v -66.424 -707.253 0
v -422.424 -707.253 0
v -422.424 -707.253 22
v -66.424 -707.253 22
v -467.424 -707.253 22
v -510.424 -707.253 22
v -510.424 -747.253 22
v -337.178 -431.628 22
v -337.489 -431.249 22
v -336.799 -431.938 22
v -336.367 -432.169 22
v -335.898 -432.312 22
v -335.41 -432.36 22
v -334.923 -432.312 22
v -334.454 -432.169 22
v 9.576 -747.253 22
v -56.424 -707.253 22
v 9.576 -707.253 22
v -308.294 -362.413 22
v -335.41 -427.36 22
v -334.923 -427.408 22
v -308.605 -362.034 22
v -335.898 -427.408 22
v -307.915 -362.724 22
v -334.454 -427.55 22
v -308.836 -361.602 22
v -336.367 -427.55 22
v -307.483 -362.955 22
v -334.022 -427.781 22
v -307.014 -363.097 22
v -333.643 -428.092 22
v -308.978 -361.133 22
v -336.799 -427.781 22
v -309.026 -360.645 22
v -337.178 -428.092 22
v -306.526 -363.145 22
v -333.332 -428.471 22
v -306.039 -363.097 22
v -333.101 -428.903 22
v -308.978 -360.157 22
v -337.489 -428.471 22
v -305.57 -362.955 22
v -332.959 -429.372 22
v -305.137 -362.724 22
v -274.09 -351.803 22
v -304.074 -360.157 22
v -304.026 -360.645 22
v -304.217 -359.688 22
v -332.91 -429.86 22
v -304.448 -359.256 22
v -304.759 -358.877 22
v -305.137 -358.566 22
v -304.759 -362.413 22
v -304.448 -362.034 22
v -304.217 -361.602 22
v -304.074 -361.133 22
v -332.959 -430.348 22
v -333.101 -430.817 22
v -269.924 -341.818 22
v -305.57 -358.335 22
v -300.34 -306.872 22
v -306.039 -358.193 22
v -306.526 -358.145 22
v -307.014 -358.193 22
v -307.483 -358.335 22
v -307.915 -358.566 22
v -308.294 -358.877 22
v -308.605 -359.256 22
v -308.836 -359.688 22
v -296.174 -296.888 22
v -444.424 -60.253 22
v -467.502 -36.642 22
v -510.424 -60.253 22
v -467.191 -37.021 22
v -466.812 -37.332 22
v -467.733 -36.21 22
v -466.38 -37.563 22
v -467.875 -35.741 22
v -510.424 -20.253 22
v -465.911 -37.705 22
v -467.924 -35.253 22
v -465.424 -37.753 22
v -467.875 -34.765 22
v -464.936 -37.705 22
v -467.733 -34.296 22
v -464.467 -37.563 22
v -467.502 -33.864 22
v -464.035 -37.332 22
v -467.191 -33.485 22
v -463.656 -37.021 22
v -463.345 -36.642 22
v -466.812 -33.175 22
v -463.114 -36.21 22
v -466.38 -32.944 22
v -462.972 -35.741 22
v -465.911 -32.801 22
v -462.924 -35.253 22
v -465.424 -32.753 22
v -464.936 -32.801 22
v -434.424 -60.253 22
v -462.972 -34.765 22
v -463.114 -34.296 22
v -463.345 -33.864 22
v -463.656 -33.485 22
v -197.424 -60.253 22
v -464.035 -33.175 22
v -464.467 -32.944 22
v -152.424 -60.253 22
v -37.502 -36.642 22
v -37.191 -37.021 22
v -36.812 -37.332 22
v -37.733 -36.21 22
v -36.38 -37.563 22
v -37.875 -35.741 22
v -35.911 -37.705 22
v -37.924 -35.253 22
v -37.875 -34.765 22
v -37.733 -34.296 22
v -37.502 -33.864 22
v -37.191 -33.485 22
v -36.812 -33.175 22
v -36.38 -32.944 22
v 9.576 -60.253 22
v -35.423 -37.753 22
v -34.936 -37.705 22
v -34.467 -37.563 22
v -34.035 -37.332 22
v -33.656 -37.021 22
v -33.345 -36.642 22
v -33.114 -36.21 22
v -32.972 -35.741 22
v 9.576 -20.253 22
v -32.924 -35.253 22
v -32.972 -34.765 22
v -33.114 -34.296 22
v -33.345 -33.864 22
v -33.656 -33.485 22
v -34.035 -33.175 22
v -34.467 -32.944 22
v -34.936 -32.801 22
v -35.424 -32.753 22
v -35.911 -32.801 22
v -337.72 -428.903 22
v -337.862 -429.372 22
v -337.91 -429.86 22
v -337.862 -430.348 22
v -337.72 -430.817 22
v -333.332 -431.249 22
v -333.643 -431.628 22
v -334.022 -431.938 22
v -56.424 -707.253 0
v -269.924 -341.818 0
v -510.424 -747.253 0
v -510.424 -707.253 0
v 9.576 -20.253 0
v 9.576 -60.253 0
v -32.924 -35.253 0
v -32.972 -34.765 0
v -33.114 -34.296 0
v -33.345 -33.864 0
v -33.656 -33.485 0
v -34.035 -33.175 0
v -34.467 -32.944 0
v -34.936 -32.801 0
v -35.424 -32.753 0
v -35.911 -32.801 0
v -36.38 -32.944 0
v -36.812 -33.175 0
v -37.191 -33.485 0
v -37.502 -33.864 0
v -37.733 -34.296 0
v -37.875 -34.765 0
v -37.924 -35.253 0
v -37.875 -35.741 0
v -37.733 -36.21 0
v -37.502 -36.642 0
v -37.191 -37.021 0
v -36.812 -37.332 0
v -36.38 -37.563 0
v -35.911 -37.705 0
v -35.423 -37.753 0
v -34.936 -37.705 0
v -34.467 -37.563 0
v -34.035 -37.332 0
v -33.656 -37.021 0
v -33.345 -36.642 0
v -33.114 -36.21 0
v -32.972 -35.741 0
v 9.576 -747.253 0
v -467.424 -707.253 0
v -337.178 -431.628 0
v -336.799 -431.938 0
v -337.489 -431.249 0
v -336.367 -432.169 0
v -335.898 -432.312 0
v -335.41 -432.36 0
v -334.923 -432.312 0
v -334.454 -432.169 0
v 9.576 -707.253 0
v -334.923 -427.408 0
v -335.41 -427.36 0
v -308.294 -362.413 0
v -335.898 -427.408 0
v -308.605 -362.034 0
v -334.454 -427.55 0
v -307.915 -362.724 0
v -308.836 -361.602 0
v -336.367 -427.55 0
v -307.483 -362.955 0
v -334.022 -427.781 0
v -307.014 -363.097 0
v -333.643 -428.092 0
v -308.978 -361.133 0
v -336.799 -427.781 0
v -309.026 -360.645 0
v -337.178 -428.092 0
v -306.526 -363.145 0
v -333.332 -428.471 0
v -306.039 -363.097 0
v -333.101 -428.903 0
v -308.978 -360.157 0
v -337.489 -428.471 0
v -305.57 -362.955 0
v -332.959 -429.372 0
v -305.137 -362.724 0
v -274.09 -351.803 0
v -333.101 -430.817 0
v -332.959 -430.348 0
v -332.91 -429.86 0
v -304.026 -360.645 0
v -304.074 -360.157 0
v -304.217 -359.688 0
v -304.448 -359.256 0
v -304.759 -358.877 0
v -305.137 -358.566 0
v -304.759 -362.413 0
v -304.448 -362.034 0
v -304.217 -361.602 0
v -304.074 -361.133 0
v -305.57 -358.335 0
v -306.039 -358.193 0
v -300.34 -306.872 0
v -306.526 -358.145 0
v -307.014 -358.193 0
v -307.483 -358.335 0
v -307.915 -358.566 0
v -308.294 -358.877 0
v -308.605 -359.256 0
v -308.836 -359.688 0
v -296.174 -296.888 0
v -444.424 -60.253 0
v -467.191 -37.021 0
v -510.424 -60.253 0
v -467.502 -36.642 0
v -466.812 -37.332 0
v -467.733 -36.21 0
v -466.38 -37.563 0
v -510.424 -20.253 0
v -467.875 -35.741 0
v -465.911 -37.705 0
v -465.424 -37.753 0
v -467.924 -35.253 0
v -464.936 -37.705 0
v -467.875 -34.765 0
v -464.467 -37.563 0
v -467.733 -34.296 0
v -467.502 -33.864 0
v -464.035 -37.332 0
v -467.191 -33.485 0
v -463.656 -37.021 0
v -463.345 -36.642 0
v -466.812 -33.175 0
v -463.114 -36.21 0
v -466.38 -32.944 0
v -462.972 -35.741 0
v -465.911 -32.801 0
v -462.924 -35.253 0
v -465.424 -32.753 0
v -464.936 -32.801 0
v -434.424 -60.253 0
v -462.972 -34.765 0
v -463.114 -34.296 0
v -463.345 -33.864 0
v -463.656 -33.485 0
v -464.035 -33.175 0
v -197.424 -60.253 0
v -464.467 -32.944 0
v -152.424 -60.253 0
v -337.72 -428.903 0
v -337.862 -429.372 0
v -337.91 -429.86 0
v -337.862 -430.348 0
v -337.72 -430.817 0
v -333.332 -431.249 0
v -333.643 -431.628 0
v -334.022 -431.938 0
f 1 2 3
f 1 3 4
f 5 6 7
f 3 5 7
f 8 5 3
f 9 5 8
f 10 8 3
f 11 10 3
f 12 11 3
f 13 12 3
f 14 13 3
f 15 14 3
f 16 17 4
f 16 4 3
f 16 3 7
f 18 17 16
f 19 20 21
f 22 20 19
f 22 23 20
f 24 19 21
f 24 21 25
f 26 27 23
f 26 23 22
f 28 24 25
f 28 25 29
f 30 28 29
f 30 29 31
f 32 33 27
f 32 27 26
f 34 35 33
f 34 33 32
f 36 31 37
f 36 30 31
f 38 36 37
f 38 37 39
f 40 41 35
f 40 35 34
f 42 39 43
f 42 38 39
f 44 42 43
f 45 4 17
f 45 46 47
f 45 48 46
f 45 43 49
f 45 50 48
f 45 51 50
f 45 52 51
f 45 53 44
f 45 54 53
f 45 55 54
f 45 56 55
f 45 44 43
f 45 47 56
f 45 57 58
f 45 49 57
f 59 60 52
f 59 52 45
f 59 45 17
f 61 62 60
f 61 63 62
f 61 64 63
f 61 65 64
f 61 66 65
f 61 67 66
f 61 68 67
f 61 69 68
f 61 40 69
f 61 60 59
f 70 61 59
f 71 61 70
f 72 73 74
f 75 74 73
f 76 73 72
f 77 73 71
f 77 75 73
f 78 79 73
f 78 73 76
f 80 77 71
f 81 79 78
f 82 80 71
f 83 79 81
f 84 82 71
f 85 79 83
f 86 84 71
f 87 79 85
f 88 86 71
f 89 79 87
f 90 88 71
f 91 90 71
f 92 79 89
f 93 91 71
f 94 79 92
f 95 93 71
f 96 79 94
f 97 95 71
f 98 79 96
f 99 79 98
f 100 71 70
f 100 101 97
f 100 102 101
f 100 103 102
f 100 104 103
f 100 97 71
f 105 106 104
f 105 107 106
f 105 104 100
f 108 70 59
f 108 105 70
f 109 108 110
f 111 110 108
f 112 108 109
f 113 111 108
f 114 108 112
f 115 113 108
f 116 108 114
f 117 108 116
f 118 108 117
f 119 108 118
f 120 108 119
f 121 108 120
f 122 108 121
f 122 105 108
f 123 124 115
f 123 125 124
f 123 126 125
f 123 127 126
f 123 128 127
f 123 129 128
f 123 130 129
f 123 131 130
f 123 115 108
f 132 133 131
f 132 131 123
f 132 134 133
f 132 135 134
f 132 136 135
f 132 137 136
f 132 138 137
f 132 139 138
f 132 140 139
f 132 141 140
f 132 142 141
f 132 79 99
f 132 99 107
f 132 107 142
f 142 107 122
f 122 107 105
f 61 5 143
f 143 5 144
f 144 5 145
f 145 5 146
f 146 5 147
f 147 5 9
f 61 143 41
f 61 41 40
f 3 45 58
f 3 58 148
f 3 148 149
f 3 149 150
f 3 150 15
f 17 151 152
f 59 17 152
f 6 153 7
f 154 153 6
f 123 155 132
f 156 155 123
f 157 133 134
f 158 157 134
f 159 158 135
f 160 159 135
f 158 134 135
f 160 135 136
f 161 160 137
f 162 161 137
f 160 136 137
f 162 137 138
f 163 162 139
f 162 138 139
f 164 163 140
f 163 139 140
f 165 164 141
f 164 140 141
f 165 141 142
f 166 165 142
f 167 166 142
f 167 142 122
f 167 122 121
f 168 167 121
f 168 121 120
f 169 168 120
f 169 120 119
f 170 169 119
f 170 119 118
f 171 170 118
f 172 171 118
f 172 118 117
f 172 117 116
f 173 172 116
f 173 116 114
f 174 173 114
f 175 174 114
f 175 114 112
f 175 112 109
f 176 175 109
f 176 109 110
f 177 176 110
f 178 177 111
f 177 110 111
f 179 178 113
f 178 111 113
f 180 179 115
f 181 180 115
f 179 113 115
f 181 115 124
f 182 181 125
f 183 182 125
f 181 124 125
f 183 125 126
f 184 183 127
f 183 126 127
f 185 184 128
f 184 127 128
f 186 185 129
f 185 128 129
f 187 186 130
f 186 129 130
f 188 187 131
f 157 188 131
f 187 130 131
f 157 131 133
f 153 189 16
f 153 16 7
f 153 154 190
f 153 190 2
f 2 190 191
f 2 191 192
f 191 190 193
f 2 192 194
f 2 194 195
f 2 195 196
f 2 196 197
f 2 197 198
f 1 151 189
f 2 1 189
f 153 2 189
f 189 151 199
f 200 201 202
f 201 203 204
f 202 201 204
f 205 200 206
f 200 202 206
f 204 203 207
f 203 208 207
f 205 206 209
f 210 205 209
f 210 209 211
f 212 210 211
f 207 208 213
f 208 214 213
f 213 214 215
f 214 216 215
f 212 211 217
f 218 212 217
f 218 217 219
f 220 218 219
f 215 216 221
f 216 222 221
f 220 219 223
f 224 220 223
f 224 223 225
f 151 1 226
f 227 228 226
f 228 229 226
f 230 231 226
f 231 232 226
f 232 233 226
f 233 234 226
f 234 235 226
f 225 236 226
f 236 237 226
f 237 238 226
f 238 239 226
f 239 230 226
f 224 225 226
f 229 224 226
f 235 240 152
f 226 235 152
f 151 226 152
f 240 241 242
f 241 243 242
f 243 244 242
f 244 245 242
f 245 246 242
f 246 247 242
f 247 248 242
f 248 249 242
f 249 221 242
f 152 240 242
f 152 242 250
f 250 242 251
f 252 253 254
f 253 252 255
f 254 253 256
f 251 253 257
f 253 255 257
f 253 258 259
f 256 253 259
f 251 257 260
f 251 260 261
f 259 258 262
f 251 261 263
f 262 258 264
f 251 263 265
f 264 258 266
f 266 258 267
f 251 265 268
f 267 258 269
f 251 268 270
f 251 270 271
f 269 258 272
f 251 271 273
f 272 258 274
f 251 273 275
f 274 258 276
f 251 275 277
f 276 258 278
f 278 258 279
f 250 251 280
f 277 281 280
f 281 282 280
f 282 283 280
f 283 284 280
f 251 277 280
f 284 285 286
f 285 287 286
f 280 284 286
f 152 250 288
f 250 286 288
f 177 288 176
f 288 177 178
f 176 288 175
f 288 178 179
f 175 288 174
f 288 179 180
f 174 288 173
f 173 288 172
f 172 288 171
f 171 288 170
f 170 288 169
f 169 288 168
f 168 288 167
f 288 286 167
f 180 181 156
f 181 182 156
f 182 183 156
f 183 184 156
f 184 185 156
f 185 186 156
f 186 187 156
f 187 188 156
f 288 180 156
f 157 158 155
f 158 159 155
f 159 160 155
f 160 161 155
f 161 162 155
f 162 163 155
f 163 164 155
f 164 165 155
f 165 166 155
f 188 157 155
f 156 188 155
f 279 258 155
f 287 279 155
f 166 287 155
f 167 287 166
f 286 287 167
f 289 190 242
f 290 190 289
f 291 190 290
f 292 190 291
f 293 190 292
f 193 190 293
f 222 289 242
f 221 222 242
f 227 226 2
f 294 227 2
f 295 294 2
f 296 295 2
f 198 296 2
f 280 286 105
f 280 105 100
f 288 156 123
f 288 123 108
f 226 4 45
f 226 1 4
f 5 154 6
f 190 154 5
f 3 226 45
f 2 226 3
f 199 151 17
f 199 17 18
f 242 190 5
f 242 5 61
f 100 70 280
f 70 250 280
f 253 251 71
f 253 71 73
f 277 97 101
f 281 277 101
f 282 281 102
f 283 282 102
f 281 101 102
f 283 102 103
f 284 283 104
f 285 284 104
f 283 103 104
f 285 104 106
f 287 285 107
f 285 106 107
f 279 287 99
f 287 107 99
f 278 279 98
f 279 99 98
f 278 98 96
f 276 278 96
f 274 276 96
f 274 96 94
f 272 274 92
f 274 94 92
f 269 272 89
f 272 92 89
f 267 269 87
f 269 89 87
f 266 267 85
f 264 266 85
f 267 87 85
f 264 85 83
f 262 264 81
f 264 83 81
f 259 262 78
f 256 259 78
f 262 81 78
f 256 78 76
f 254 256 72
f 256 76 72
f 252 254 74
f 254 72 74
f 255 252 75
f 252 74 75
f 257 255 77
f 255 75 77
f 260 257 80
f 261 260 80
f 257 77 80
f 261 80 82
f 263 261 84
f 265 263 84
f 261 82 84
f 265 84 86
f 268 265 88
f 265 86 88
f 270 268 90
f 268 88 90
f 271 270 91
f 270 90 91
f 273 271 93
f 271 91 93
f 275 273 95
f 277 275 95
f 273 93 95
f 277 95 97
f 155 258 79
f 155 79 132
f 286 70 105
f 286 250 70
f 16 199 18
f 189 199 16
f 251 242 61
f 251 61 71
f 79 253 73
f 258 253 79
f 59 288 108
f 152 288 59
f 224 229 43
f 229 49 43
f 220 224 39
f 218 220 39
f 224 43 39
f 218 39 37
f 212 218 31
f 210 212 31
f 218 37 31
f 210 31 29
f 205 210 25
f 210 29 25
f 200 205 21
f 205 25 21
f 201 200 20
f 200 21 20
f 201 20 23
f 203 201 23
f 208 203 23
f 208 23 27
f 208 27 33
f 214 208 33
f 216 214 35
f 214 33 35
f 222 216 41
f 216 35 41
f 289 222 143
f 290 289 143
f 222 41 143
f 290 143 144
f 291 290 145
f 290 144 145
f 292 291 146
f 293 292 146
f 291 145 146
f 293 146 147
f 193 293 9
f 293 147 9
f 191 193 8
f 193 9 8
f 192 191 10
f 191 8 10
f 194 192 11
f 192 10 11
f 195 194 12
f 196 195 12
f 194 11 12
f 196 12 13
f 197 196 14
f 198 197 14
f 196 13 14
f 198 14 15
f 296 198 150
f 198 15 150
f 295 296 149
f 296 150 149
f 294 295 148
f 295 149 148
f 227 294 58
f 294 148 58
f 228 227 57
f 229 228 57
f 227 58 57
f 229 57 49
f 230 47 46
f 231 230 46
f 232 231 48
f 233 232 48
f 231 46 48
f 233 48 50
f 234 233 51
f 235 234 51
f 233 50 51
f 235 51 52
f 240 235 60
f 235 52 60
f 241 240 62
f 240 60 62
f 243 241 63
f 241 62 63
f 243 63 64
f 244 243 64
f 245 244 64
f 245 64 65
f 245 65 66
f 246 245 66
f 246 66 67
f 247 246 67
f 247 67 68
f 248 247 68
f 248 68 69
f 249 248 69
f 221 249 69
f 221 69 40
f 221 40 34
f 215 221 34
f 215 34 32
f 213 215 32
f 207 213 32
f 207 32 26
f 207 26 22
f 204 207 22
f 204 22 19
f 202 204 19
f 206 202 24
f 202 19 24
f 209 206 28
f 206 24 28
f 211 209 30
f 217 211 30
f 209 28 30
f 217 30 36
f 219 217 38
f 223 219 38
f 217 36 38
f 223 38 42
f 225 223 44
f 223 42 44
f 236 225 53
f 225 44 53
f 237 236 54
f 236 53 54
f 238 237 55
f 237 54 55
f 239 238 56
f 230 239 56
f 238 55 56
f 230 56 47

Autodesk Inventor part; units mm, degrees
ref_plane "YZ Plane" through (0, 0, 0) normal (1, 0, 0) x (0, 1, 0)
ref_plane "XZ Plane" through (0, 0, 0) normal (0, 1, 0) x (-1, 0, 0)
ref_plane "XY Plane" through (0, 0, 0) normal (0, 0, 1) x (1, 0, 0)
sketch "草图1" plane through (0, 0, 0) normal (0, 0, 1) x (1, 0, 0)
  line L0 (-510.4235, -20.2532) -> (9.5765, -20.2532)
  line L1 (9.5765, -20.2532) -> (9.5765, -60.2532)
  line L2 (9.5765, -60.2532) -> (-510.4235, -60.2532)
  line L3 (-510.4235, -60.2532) -> (-510.4235, -20.2532)
  line L4 (-510.4235, -707.2532) -> (9.5765, -707.2532)
  line L5 (9.5765, -707.2532) -> (9.5765, -747.2532)
  line L6 (9.5765, -747.2532) -> (-510.4235, -747.2532)
  line L7 (-510.4235, -747.2532) -> (-510.4235, -707.2532)
  line L8 (-66.4235, -707.2532) -> (-274.0901, -351.8026)
  line L9 (-56.4235, -707.2532) -> (-269.9235, -341.818)
  line L10 (-296.1735, -296.8875) -> (-434.4235, -60.2532)
  line L11 (-300.3401, -306.872) -> (-444.4235, -60.2532)
  line L12 (-152.4235, -60.2532) -> (-269.9235, -341.818)
  line L13 (-274.0901, -351.8026) -> (-422.4235, -707.2532)
  line L14 (-467.4235, -707.2532) -> (-300.3401, -306.872)
  line L15 (-296.1735, -296.8875) -> (-197.4235, -60.2532)
  point P0 (0, 0)
  dimension "d0" = 520
  dimension "d1" = 40
  dimension "d2" = 162
  dimension "d3" = 45
  dimension "d4" = 647
  dimension "d5" = 40
  dimension "d6" = 43
  dimension "d7" = 66
  dimension "d8" = 66
  dimension "d9" = 10
extrude "拉伸1" add sketch "草图1" along normal blind 22 contours L0 L1 L2 L3 | L2 L10 L15 L12 L9 L4 L8 L13 L14 L11 | L4 L5 L6 L7
sketch "草图2" plane through (0, 0, 22) normal (0, 0, 1) x (1, 0, 0)
  line L0 (9.5765, -60.2532) -> (9.5765, -20.2532) projected
  circle A0 centre (-35.4235, -35.2532) radius 2.5
  line L1 (9.5765, -20.2532) -> (-510.4235, -20.2532) projected
  line L2 (-510.4235, -20.2532) -> (-510.4235, -60.2532) projected
  circle A1 centre (-465.4235, -35.2532) radius 2.5
  line L3 (-300.3401, -306.872) -> (-467.4235, -707.2532) projected
  circle A2 centre (-306.5264, -360.6449) radius 2.5
  circle A3 centre (-335.4105, -429.8598) radius 2.5
  point P0 (0, 0)
  dimension "d12" = 45
  dimension "d13" = 5
  dimension "d14" = 15
  dimension "d15" = 45
  dimension "d16" = 15
  dimension "d17" = 5
  dimension "d46" = 5
  dimension "d47" = 5
  dimension "d48" = 75
extrude "拉伸2" cut sketch "草图2" against normal blind 25
thread "螺纹1" size "M5x0.8" class "6H" standard "ANSI Metric M Profile" full length
thread "螺纹2" size "M5x0.8" class "6H" standard "ANSI Metric M Profile" full length
properties part number "Desk stand"
